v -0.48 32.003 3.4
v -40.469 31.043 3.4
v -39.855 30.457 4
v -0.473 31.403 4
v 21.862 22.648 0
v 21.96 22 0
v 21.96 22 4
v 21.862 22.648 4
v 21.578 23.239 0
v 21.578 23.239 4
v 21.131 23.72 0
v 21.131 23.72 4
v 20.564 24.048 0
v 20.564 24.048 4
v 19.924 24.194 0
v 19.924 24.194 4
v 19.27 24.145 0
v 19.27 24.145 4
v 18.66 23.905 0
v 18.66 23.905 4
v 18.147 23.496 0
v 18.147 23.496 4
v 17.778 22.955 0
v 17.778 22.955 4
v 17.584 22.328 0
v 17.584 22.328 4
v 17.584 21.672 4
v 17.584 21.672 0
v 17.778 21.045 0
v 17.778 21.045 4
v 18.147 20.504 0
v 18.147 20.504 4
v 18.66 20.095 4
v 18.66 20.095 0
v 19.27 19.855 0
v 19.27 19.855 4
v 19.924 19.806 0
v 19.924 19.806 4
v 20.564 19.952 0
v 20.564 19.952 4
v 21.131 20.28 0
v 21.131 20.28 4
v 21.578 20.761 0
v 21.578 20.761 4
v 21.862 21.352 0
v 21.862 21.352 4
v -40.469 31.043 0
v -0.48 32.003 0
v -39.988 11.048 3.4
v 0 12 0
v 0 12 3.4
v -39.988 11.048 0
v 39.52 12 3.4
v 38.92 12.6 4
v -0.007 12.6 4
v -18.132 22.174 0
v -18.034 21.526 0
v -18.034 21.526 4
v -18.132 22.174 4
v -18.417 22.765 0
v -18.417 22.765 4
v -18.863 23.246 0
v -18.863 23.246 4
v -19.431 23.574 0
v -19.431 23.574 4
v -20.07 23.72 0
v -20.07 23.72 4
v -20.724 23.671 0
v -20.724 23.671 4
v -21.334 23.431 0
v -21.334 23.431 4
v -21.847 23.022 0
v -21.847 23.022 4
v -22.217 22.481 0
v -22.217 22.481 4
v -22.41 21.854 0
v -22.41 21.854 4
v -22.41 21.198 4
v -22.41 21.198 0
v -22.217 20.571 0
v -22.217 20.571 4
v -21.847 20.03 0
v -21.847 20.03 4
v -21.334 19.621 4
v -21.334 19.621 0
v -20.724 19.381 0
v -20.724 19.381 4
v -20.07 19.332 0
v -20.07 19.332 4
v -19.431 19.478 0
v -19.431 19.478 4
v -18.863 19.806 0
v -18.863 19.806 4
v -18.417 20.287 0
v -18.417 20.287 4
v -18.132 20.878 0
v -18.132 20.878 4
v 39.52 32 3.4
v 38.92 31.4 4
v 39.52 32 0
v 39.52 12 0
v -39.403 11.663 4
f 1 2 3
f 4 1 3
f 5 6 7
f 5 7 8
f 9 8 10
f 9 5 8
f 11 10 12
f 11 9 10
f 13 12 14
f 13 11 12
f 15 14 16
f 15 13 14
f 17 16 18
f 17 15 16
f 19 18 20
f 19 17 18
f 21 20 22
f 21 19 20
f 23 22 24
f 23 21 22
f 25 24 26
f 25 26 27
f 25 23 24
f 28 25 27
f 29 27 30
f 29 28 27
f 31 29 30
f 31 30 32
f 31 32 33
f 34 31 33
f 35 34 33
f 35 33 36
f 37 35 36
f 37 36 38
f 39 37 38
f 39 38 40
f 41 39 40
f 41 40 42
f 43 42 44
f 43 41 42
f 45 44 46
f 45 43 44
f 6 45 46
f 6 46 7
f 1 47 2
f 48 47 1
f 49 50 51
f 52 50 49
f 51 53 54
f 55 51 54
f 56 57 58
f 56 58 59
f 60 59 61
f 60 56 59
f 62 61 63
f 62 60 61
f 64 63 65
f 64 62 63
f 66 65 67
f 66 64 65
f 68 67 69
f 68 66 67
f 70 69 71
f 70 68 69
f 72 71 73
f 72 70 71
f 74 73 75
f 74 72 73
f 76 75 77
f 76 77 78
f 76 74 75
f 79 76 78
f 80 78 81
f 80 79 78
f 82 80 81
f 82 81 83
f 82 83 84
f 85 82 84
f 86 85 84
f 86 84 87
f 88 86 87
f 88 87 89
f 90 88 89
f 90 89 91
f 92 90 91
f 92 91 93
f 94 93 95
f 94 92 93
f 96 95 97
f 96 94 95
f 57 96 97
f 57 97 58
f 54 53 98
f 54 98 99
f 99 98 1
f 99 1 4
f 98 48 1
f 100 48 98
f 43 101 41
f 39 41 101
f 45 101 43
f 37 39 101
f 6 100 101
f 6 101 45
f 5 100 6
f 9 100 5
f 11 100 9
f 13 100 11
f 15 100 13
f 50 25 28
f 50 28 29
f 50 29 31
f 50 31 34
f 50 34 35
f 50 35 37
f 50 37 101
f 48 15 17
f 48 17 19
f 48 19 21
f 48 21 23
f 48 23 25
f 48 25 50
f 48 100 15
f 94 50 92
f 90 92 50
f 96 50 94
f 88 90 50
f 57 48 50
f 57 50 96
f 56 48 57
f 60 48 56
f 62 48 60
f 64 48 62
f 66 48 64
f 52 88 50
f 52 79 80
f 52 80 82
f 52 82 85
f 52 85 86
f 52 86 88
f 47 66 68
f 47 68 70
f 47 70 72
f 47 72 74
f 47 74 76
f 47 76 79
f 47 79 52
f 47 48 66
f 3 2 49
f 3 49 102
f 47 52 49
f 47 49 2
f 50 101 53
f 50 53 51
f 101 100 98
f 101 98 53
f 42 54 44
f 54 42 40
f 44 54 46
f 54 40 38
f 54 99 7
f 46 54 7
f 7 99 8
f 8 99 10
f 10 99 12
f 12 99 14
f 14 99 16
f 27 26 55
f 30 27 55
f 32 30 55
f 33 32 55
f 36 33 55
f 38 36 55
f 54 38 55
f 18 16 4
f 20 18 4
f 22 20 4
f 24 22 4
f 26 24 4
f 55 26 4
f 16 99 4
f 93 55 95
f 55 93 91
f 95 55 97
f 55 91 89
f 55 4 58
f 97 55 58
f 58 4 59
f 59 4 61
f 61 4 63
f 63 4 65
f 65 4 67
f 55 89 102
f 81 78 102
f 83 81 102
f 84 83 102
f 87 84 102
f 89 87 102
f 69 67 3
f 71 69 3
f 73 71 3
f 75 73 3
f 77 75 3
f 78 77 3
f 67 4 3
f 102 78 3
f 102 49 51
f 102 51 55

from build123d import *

# Parameters (mm, degrees)
SKETCH3_R           = 2.2
BOSS_EXTRUDE1_DEPTH = 4
CHAMFER1_SIZE       = 0.6


with BuildPart() as part:
    # Sketch3 → Boss-Extrude1 (new body)
    with BuildSketch(Plane.XY):
        Polygon((-39.988460604, 11.048492995), (-40.468829865, 31.042723297), (-0.480369261, 32.003461819), (39.51963059, 32), (39.51963059, 12), (0, 12), align=None)
        with Locations((19.759815295, 22)):
            Circle(SKETCH3_R, mode=Mode.SUBTRACT)
        with Locations((-20.234414932, 21.525977407)):
            Circle(SKETCH3_R, mode=Mode.SUBTRACT)
    extrude(amount=BOSS_EXTRUDE1_DEPTH)

    # Chamfer1
    # the kernel refuses this chamfer: 0.6 mm, written as the material it takes off along each edge
    with BuildSketch(Plane(origin=(39.51963059, 33.543009793, 4), x_dir=(0, 0, -1), z_dir=(0, -1, 0)), Plane(origin=(-39.951399881, 9.505928338, 4), x_dir=(0, 0, -1), z_dir=(-0.024018463033284497, 0.9997115151049921, 0))) as chamfer1_piece_1:
        Polygon((CHAMFER1_SIZE, 0), (0, -CHAMFER1_SIZE), (0, 0), align=None)
    extrude(amount=23.086019586, mode=Mode.SUBTRACT)
    with BuildSketch(Plane(origin=(-2.023379048, 32.003595359, 4), x_dir=(0, 0, -1), z_dir=(0.999999996254941, -8.654546850213052e-05, 0)), Plane(origin=(-42.011394523, 31.005662574, 4), x_dir=(0, 0, -1), z_dir=(0.9997115151049922, 0.02401846303328057, 0))) as chamfer1_piece_2:
        Polygon((CHAMFER1_SIZE, 0), (0, -CHAMFER1_SIZE), (0, 0), align=None)
    extrude(amount=43.086019586, mode=Mode.SUBTRACT)
    with BuildSketch(Plane(origin=(1.542573167, 12.036704818, 4), x_dir=(0, 0, -1), z_dir=(-0.9997170300986874, -0.023787806344009378, 0))) as chamfer1_piece_3_section:
        Polygon((CHAMFER1_SIZE, 0), (0, -CHAMFER1_SIZE), (0, 0), align=None)
    chamfer1_piece_3 = extrude(amount=43.085798923, mode=Mode.PRIVATE)
    chamfer1_piece_3 = split(chamfer1_piece_3, bisect_by=Plane(origin=(1.542573167, 12.318352409, 3.718352409), z_dir=(0, -0.7071067811865478, 0.7071067811865474)), keep=Keep.TOP, mode=Mode.PRIVATE)
    add(chamfer1_piece_3, mode=Mode.SUBTRACT)
    with BuildSketch(Plane(origin=(41.062640382, 12, 4), x_dir=(0, 0, -1), z_dir=(-1, 0, 0))) as chamfer1_piece_4_section:
        Polygon((CHAMFER1_SIZE, 0), (0, -CHAMFER1_SIZE), (0, 0), align=None)
    chamfer1_piece_4 = extrude(amount=42.605650175, mode=Mode.PRIVATE)
    chamfer1_piece_4 = split(chamfer1_piece_4, bisect_by=Plane(origin=(41.043886193, 12.788171977, 3.211604931), z_dir=(0.01682051917540141, -0.706906691250458, 0.7071067811865475)), keep=Keep.TOP, mode=Mode.PRIVATE)
    add(chamfer1_piece_4, mode=Mode.SUBTRACT)


solid = part.part
